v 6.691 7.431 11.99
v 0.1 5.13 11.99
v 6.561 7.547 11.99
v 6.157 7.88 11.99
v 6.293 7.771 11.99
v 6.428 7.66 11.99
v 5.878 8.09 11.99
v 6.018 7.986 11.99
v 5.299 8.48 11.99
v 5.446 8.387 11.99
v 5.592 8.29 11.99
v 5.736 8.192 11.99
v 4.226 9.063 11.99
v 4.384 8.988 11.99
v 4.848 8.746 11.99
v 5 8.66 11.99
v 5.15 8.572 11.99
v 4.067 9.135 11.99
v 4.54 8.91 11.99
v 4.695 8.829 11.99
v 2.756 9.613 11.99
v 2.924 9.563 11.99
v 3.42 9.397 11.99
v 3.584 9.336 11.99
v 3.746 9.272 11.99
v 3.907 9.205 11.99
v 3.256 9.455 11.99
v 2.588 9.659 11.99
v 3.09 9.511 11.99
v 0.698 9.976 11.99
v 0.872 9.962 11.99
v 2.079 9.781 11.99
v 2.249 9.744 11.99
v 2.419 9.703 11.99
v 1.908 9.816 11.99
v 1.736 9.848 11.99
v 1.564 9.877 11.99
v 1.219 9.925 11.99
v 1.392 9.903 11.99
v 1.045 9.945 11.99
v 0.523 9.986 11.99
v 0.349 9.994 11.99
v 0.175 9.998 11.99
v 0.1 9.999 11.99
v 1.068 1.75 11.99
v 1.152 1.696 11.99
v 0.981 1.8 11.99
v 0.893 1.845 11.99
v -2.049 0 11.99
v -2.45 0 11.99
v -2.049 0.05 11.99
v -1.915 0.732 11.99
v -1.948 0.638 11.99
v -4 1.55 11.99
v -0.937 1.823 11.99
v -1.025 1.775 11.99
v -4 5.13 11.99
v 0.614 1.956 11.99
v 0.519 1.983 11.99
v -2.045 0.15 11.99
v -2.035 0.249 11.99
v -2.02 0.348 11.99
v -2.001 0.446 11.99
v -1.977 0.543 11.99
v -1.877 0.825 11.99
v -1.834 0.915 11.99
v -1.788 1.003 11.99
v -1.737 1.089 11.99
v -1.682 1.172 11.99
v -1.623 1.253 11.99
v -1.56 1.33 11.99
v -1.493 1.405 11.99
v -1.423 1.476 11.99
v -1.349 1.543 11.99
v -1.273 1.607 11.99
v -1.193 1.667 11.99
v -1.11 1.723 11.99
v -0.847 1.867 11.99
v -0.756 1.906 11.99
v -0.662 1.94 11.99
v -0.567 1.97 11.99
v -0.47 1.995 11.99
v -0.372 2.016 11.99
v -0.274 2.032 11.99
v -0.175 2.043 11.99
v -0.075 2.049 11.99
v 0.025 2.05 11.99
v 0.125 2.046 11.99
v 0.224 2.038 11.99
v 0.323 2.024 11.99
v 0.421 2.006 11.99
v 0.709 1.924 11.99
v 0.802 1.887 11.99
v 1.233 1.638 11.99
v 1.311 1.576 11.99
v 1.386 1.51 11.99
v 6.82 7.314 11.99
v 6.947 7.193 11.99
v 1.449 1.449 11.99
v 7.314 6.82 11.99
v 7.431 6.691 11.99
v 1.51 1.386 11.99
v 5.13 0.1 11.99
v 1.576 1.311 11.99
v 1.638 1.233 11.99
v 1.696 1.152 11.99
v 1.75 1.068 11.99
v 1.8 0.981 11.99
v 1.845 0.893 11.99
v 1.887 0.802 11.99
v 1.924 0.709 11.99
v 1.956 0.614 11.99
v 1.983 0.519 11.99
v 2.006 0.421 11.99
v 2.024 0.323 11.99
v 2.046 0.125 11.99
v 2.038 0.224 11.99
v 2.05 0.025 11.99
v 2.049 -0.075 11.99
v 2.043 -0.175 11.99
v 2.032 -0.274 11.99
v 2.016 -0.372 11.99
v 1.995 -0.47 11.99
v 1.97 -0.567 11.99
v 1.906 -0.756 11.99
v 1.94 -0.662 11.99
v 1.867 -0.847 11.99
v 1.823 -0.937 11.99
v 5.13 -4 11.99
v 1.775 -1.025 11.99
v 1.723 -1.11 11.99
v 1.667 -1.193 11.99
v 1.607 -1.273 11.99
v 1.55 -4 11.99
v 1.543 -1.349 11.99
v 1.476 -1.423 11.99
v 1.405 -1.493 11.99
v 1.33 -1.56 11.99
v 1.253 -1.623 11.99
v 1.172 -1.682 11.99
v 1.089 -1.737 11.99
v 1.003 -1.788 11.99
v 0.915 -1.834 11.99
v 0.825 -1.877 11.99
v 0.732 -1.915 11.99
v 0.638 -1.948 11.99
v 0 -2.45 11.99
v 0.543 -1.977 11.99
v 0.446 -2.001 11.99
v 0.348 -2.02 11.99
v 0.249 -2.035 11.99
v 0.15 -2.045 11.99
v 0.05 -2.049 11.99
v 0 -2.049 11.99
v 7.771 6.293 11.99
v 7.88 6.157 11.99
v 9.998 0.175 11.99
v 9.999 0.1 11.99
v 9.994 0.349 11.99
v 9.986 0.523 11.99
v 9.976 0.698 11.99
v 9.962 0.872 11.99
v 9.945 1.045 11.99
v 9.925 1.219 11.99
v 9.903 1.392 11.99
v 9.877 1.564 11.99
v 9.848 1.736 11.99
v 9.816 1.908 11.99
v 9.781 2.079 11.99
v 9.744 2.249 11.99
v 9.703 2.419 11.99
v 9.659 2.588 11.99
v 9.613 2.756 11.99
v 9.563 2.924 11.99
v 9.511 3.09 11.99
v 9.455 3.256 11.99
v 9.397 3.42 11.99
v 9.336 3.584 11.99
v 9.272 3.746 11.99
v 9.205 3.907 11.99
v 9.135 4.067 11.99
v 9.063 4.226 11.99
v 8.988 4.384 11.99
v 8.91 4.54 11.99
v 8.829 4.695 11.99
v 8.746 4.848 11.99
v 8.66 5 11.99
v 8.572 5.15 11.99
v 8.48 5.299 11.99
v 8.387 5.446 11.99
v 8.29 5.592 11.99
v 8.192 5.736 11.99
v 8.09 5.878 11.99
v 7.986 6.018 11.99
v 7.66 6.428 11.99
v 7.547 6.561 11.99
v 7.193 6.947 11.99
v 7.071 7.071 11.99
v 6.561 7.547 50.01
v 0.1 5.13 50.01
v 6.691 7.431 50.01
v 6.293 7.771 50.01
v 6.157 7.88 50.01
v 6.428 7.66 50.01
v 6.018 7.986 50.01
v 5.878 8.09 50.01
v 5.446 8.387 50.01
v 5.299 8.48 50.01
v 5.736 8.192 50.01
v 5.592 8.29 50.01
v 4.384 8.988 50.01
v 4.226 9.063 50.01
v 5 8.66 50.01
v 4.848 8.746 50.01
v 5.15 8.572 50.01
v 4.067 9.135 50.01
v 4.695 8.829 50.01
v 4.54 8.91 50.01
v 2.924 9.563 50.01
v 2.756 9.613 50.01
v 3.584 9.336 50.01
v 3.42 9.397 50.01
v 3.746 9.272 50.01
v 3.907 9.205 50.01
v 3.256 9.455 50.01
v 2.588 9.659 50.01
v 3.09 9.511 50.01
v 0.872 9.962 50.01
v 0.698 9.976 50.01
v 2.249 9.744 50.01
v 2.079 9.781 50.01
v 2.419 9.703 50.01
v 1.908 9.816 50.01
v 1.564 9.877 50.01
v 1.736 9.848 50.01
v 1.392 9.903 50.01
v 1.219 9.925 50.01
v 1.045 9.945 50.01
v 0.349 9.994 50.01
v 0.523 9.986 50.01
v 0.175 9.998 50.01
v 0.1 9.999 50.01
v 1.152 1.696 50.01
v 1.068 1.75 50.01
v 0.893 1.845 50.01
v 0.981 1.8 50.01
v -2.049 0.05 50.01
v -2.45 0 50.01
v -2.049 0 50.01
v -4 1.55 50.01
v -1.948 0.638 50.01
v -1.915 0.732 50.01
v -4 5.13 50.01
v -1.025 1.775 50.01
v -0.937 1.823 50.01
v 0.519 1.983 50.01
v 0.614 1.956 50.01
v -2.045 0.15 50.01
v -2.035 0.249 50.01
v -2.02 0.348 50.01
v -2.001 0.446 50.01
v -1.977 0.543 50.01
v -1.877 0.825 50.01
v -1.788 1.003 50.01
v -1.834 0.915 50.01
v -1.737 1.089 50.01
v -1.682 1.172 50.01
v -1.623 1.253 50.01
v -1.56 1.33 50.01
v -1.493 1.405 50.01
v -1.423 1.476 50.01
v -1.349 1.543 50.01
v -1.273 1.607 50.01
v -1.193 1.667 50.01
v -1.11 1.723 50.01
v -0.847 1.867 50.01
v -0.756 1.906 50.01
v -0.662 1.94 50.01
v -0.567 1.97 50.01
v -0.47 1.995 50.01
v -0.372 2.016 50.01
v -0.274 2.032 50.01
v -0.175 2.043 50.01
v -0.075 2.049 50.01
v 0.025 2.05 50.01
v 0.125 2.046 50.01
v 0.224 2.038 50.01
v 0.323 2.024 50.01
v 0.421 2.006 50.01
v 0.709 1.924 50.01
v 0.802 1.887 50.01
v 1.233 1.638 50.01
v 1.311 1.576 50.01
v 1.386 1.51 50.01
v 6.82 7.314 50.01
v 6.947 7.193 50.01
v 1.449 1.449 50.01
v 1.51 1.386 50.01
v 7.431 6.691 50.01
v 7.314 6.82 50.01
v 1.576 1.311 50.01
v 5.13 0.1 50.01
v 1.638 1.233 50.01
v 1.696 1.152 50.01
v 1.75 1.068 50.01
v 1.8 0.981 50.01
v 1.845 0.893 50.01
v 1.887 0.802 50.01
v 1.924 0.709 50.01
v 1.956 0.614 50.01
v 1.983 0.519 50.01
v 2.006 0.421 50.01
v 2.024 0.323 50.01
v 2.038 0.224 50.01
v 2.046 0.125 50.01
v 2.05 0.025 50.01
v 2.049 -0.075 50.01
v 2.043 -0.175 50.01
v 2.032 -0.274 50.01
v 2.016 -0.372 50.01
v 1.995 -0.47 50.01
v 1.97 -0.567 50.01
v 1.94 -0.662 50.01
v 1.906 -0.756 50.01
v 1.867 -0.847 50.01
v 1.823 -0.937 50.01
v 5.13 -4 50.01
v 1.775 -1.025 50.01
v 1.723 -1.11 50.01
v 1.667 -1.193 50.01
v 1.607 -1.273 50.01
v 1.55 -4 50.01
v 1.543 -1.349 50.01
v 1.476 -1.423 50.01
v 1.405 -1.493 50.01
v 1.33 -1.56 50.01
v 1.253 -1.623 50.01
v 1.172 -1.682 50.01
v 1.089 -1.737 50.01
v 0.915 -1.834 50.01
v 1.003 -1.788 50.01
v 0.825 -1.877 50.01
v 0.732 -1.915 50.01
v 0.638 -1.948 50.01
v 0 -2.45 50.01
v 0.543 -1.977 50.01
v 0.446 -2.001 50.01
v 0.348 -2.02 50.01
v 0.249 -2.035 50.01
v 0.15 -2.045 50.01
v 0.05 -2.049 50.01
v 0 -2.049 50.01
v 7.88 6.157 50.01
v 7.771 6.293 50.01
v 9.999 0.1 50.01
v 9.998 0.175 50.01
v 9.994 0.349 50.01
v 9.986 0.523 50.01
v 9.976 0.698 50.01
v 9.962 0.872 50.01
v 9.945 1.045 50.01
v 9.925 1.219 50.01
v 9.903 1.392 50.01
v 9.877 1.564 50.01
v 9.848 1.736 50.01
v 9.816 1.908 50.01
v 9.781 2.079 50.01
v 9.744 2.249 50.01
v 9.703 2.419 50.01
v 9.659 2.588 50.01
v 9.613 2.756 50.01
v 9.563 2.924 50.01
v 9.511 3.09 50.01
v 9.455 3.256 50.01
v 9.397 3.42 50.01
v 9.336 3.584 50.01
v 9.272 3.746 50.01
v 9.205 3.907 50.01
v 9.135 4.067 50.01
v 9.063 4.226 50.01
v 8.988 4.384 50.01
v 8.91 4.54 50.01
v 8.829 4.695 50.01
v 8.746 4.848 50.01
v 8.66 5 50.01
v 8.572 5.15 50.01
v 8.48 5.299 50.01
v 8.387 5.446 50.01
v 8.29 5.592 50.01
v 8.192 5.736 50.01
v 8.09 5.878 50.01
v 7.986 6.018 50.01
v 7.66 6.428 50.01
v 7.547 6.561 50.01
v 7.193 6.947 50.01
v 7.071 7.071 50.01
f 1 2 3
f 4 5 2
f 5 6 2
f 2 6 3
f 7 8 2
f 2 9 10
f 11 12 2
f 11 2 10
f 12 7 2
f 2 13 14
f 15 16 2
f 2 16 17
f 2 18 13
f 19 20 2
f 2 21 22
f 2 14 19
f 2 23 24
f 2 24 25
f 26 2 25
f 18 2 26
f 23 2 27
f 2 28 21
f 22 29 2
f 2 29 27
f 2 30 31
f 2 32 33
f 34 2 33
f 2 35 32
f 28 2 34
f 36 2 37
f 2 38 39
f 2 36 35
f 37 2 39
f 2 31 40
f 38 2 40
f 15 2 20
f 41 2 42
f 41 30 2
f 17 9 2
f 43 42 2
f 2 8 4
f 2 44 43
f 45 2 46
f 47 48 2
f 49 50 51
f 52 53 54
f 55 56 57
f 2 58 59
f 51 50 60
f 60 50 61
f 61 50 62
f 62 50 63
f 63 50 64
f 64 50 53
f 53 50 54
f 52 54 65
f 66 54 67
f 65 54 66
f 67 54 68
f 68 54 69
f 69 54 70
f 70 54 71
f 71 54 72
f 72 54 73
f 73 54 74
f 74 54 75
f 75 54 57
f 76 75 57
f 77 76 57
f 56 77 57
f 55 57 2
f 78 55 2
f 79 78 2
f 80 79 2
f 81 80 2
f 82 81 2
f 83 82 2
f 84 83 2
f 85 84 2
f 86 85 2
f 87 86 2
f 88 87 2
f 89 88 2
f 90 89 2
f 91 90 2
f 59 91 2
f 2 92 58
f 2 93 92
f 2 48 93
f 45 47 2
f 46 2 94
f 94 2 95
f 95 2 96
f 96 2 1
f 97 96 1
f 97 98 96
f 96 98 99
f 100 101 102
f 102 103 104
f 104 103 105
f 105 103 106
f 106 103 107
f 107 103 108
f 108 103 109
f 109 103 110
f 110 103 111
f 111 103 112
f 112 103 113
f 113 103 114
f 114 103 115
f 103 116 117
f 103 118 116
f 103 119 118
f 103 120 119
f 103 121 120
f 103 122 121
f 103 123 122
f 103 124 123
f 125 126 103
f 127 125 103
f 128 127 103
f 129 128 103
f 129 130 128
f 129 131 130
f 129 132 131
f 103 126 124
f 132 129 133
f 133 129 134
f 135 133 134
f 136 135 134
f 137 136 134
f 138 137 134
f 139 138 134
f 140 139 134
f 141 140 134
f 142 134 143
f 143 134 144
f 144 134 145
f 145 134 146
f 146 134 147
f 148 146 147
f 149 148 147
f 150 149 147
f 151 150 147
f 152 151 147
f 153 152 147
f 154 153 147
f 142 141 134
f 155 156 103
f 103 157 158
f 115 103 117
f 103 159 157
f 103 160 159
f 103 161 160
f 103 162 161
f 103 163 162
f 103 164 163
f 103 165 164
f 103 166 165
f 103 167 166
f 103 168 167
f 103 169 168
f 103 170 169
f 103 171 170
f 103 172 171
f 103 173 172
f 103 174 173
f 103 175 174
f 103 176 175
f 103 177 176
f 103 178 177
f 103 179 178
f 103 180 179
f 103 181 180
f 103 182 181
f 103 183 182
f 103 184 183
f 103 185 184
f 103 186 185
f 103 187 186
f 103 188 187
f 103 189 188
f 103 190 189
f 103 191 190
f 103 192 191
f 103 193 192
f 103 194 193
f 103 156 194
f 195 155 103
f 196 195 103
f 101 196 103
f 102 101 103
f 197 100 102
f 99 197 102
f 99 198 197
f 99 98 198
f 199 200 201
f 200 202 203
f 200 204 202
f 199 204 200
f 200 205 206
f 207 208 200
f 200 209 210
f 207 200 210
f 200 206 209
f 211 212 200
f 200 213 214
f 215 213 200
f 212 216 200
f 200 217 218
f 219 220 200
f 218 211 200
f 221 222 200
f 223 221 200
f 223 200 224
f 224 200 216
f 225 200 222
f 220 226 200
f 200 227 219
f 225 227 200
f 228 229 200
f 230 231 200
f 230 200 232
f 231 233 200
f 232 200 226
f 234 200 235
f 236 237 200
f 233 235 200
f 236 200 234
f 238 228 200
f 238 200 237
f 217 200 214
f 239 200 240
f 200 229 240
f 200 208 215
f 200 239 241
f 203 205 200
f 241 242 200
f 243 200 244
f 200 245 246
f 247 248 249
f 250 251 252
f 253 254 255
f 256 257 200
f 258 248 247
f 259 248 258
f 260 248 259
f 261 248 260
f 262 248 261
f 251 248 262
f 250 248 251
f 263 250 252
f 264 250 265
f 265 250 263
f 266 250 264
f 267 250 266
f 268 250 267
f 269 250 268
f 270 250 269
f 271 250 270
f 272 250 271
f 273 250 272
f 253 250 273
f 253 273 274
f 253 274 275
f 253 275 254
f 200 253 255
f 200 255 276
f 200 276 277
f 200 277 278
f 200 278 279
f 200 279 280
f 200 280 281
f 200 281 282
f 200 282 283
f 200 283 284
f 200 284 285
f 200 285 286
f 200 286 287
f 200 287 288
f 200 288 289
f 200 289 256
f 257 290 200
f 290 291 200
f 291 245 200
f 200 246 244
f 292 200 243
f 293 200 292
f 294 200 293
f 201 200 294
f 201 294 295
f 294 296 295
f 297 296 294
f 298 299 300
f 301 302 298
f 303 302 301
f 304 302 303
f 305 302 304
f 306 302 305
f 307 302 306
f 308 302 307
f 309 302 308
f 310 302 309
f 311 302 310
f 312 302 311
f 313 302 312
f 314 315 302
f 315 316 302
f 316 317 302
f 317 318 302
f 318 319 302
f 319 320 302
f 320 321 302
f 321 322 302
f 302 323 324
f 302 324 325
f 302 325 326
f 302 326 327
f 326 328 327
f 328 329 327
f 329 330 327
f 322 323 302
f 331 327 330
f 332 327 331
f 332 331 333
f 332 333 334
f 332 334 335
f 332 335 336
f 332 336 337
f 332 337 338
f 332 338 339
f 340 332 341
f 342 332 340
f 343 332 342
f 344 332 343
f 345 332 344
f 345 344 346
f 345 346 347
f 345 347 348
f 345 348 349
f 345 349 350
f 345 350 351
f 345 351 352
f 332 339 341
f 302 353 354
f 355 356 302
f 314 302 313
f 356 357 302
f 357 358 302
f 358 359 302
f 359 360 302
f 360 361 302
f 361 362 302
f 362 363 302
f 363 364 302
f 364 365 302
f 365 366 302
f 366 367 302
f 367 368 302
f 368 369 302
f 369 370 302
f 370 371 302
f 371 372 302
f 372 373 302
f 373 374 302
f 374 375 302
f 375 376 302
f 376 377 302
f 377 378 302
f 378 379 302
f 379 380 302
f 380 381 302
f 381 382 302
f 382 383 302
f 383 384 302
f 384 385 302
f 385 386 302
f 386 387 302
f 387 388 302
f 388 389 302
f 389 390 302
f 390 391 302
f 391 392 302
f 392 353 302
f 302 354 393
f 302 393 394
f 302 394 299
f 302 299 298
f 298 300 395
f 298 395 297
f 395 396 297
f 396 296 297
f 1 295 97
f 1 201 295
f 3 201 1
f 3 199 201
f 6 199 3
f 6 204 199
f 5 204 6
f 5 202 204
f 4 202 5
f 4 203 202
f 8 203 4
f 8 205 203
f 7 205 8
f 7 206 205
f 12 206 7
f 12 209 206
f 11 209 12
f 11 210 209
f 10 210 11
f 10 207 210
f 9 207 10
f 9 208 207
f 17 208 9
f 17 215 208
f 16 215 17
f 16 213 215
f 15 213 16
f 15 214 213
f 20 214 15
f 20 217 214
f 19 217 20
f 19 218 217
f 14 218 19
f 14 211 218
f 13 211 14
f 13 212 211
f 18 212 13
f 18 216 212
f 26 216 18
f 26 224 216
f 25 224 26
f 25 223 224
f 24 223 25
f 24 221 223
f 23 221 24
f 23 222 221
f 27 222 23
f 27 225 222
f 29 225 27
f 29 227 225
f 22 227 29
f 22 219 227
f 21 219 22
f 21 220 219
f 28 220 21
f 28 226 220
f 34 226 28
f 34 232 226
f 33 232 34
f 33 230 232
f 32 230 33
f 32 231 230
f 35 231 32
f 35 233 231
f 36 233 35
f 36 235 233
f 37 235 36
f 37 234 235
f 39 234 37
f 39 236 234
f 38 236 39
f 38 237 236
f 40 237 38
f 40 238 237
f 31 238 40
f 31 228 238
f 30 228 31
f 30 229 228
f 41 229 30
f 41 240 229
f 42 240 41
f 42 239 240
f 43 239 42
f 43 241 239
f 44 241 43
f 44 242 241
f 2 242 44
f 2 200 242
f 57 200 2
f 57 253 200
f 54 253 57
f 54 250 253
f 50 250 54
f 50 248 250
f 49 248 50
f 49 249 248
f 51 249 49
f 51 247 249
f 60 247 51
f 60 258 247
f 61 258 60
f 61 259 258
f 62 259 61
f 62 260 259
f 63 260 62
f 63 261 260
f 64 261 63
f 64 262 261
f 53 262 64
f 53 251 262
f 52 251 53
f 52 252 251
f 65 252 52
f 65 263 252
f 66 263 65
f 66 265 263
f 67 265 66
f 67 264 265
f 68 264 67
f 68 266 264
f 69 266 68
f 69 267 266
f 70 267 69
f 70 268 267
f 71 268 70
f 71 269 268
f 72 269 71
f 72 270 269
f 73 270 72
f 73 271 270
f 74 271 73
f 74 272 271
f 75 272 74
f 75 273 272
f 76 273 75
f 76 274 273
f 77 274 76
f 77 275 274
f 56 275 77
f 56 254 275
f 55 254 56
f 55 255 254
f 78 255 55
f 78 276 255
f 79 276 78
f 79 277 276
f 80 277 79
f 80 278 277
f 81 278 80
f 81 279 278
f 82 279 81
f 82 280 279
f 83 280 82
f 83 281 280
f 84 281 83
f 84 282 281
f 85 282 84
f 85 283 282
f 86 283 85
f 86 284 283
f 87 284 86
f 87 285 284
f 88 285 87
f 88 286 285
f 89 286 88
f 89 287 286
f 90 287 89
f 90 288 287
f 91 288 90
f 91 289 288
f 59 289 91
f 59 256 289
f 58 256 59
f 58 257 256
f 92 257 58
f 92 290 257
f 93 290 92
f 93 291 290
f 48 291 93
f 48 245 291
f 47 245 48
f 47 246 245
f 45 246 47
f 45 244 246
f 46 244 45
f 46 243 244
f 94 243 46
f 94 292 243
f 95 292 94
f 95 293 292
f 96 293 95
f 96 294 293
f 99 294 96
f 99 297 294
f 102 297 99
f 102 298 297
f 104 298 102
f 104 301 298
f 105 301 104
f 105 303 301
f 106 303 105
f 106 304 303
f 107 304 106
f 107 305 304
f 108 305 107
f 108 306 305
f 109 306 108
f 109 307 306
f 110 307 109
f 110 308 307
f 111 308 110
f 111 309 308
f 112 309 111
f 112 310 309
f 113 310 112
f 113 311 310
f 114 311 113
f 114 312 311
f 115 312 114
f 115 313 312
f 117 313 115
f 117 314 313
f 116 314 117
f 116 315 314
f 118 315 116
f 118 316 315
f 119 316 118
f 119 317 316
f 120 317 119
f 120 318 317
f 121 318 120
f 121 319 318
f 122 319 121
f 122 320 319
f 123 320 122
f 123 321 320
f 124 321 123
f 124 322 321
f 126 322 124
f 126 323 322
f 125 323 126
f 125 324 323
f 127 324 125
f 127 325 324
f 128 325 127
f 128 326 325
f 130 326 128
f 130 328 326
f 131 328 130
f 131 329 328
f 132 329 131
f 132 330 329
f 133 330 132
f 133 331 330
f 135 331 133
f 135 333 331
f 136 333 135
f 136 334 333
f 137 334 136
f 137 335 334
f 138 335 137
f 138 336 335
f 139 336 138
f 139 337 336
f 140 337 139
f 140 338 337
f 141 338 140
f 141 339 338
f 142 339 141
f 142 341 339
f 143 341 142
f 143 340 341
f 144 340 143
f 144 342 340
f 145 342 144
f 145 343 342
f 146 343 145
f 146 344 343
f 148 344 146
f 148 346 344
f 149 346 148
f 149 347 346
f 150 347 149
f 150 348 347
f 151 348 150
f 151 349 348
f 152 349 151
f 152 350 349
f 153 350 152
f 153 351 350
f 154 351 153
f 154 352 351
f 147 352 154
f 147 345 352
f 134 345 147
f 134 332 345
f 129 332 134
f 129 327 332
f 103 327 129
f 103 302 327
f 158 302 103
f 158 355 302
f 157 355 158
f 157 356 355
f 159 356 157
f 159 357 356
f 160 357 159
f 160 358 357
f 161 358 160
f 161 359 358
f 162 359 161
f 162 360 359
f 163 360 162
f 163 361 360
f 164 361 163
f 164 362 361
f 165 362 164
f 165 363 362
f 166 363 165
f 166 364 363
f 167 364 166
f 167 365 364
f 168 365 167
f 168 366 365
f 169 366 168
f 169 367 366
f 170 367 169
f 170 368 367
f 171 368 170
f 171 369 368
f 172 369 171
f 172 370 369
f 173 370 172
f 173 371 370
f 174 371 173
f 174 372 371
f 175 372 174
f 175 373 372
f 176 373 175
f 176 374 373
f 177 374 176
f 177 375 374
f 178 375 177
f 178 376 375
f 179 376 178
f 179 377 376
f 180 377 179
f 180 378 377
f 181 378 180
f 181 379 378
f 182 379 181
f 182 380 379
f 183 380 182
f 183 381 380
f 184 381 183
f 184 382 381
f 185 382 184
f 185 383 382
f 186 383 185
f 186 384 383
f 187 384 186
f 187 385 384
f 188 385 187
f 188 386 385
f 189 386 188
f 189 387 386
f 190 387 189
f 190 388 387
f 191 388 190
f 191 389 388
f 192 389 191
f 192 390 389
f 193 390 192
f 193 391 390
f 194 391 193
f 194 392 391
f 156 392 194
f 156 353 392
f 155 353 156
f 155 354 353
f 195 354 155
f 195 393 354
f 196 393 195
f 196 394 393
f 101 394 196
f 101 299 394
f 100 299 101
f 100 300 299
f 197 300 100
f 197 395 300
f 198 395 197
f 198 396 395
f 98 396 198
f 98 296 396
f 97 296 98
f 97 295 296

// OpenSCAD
// file: ../scad/shape_modifier_utils.scad
// Overlap used to break coincident faces in booleans. Subtracting a cut that lands
// exactly on a surface leaves zero-thickness geometry, which renders unpredictably and
// slices worse; every cut is extended by this much so the faces genuinely cross.
//
// A function rather than a variable: `use <...>` exports functions but not top-level
// variable assignments, and the sweep reaches these files through `use`. Twelve modules
// across four files each declared their own `eps = 0.01` before this existed.
function geometry_eps() = 0.01;

// Length for a *centred* cutting solid that must pass entirely through material of
// depth `extent`. A centred cut reaches half this each way, so the factor leaves 50%
// clearance beyond `extent` on both sides -- a cut that lands flush on a face produces
// a zero-thickness shell rather than a clean hole.
//
// Measured against the swept parameter space: the deepest thing any of these cuts must
// clear is one bulkhead_section, one bulkhead_thickness tall, so the margin is 0.5 *
// bulkhead_thickness everywhere and scales with the part. Interconnect bulkheads stack
// two sections, but each section's cuts are applied before stacking, so the stack is
// not what a cut has to span.
function through_cut(extent) = 3 * extent;

// Distance at which to place a mask vertex so it lies outside anything within `extent`
// of the origin. Used by the half-plane polygons that trim an octant down to its
// wedge, where the vertex position only has to be "far enough" to be off the part.
//
// Worst case across 412 valid combinations is 3.25 mm of clearance, at U=0.5 with 1 mm
// panel: the shape reaches panel_offset + panel_overlap = 6.75 mm while the mask sits
// at 10 mm. Positive everywhere, and the gap widens with U.
function mask_reach(extent) = 2 * extent;


module octant_to_full() {
    mirror_x() {
        mirror_y() {
            mirror_xy() {
                children();
            }
        }
    }
}

module mirror_x() {
    union() {
        children();
        mirror([-1,0,0]) {
            children();
        }
    }
    
}

module mirror_y() {
    union() {
        children();
        mirror([0,-1,0]) {
            children();
        }
    }
    
}

module mirror_xy() {
    union() {
        children();
        mirror([1,-1,0]) {
            children();
        }
    }
}

module corner_translate(unit_width, corner_radius) {
    translate([unit_width/2-corner_radius,unit_width/2-corner_radius,0]) {
        children();
    }
}

// Move an octant out to its corner, then mirror it into all four -- the standard way
// a bulkhead profile is built from the one octant that is actually drawn.
//
// Every `*_shape` wrapper in fuselage_bulkhead_geometry.scad had this same pair open-
// coded around its own `*_octant` call. The wrappers stay: they name the full shape as
// distinct from the octant, and they are what seven call sites across two files use.
// It is the repeated body that is worth removing, not the interface.
module octant_tiled(unit_width, corner_radius) {
    octant_to_full() {
        corner_translate(unit_width, corner_radius) {
            children();
        }
    }
}


// mask lower diagonal quadrant
module octant_mask(unit_width, corner_radius) {
    eps = geometry_eps();
    polygon([[corner_radius+eps,corner_radius],
            [corner_radius+eps,-unit_width/2-corner_radius],
            [-unit_width/2-corner_radius+eps,-unit_width/2-corner_radius]]);
}

// fillet inward
module fillet_inner(radius) {
    intersection() {
        offset(r = -radius) {
            // fillet outward as well to ensure we round off any inward fillet artifacts (from input boundaries that are closer than 2*radius)
            offset(r = 2*radius) {
                offset(r = -radius) {
                    children();
                }
            }
        }
        // guarantee that the resultant shape has not gone outside the boundaries of the input shape
        children();
    }
}

// fillet outward
module fillet_outer(radius) {
    union() {
        offset(r = -radius) {
            offset(r = radius) {
                children();
            }
        }
        // guarantee that the resultant shape has not erroded into the boundaries of teh input shape
        children();
    }
}
// main file
// Isolate corner_middle at the driver's parameters, as the first porting milestone.
// The constant-section run is the 2D profile extruded, so matching its volume proves
// the profile before any of the greeble geometry is attempted.
$fa=1;
$fs=0.1;

use <../scad/fuselage_corner_geometry.scad>

U = 1.0;
FX = 1.0;
unit_length = 100*U*FX;
bulkhead_thickness = 6;
corner_radius = 10*U;
longeron_radius = 2*U;
panel_thickness = 4.77;
panel_offset = 0;
panel_overlap = 4;
panel_tolerance = 0.1;
longeron_tolerance = 0.05;
extrusion_width = 0.4;

corner_middle(unit_length, bulkhead_thickness, corner_radius, panel_thickness,
              panel_offset, panel_overlap, panel_tolerance, longeron_radius,
              longeron_tolerance, extrusion_width);
